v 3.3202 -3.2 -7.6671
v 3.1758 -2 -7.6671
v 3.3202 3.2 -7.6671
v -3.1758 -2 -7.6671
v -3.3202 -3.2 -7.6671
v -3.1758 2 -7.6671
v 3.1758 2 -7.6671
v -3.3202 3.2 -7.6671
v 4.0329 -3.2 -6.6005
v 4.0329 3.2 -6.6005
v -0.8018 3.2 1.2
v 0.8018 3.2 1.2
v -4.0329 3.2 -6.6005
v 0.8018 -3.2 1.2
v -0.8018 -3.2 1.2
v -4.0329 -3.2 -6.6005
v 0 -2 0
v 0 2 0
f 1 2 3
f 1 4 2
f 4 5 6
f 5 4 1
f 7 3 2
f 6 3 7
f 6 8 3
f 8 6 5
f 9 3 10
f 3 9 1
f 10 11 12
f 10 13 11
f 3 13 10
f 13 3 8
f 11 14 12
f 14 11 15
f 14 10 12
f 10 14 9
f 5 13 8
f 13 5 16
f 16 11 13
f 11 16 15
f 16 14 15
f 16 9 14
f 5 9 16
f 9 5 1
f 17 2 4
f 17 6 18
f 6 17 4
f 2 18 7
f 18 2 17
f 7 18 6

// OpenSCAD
$fs=1/4;
$fa=1/4;
wall=1.2;
width=4;
angle=45;
length=7;
triangle=[[0,0],[sin(angle/2),cos(angle/2)],[-sin(angle/2),cos(angle/2)]];
rotate([-90,0,0]) difference() {
  linear_extrude(height=width+2*wall,center=true) {
    offset(delta=wall,chamfer=true)polygon(length*triangle);
  }
  linear_extrude(height=width,center=true) {
    polygon(length*2*triangle);
  }
}
